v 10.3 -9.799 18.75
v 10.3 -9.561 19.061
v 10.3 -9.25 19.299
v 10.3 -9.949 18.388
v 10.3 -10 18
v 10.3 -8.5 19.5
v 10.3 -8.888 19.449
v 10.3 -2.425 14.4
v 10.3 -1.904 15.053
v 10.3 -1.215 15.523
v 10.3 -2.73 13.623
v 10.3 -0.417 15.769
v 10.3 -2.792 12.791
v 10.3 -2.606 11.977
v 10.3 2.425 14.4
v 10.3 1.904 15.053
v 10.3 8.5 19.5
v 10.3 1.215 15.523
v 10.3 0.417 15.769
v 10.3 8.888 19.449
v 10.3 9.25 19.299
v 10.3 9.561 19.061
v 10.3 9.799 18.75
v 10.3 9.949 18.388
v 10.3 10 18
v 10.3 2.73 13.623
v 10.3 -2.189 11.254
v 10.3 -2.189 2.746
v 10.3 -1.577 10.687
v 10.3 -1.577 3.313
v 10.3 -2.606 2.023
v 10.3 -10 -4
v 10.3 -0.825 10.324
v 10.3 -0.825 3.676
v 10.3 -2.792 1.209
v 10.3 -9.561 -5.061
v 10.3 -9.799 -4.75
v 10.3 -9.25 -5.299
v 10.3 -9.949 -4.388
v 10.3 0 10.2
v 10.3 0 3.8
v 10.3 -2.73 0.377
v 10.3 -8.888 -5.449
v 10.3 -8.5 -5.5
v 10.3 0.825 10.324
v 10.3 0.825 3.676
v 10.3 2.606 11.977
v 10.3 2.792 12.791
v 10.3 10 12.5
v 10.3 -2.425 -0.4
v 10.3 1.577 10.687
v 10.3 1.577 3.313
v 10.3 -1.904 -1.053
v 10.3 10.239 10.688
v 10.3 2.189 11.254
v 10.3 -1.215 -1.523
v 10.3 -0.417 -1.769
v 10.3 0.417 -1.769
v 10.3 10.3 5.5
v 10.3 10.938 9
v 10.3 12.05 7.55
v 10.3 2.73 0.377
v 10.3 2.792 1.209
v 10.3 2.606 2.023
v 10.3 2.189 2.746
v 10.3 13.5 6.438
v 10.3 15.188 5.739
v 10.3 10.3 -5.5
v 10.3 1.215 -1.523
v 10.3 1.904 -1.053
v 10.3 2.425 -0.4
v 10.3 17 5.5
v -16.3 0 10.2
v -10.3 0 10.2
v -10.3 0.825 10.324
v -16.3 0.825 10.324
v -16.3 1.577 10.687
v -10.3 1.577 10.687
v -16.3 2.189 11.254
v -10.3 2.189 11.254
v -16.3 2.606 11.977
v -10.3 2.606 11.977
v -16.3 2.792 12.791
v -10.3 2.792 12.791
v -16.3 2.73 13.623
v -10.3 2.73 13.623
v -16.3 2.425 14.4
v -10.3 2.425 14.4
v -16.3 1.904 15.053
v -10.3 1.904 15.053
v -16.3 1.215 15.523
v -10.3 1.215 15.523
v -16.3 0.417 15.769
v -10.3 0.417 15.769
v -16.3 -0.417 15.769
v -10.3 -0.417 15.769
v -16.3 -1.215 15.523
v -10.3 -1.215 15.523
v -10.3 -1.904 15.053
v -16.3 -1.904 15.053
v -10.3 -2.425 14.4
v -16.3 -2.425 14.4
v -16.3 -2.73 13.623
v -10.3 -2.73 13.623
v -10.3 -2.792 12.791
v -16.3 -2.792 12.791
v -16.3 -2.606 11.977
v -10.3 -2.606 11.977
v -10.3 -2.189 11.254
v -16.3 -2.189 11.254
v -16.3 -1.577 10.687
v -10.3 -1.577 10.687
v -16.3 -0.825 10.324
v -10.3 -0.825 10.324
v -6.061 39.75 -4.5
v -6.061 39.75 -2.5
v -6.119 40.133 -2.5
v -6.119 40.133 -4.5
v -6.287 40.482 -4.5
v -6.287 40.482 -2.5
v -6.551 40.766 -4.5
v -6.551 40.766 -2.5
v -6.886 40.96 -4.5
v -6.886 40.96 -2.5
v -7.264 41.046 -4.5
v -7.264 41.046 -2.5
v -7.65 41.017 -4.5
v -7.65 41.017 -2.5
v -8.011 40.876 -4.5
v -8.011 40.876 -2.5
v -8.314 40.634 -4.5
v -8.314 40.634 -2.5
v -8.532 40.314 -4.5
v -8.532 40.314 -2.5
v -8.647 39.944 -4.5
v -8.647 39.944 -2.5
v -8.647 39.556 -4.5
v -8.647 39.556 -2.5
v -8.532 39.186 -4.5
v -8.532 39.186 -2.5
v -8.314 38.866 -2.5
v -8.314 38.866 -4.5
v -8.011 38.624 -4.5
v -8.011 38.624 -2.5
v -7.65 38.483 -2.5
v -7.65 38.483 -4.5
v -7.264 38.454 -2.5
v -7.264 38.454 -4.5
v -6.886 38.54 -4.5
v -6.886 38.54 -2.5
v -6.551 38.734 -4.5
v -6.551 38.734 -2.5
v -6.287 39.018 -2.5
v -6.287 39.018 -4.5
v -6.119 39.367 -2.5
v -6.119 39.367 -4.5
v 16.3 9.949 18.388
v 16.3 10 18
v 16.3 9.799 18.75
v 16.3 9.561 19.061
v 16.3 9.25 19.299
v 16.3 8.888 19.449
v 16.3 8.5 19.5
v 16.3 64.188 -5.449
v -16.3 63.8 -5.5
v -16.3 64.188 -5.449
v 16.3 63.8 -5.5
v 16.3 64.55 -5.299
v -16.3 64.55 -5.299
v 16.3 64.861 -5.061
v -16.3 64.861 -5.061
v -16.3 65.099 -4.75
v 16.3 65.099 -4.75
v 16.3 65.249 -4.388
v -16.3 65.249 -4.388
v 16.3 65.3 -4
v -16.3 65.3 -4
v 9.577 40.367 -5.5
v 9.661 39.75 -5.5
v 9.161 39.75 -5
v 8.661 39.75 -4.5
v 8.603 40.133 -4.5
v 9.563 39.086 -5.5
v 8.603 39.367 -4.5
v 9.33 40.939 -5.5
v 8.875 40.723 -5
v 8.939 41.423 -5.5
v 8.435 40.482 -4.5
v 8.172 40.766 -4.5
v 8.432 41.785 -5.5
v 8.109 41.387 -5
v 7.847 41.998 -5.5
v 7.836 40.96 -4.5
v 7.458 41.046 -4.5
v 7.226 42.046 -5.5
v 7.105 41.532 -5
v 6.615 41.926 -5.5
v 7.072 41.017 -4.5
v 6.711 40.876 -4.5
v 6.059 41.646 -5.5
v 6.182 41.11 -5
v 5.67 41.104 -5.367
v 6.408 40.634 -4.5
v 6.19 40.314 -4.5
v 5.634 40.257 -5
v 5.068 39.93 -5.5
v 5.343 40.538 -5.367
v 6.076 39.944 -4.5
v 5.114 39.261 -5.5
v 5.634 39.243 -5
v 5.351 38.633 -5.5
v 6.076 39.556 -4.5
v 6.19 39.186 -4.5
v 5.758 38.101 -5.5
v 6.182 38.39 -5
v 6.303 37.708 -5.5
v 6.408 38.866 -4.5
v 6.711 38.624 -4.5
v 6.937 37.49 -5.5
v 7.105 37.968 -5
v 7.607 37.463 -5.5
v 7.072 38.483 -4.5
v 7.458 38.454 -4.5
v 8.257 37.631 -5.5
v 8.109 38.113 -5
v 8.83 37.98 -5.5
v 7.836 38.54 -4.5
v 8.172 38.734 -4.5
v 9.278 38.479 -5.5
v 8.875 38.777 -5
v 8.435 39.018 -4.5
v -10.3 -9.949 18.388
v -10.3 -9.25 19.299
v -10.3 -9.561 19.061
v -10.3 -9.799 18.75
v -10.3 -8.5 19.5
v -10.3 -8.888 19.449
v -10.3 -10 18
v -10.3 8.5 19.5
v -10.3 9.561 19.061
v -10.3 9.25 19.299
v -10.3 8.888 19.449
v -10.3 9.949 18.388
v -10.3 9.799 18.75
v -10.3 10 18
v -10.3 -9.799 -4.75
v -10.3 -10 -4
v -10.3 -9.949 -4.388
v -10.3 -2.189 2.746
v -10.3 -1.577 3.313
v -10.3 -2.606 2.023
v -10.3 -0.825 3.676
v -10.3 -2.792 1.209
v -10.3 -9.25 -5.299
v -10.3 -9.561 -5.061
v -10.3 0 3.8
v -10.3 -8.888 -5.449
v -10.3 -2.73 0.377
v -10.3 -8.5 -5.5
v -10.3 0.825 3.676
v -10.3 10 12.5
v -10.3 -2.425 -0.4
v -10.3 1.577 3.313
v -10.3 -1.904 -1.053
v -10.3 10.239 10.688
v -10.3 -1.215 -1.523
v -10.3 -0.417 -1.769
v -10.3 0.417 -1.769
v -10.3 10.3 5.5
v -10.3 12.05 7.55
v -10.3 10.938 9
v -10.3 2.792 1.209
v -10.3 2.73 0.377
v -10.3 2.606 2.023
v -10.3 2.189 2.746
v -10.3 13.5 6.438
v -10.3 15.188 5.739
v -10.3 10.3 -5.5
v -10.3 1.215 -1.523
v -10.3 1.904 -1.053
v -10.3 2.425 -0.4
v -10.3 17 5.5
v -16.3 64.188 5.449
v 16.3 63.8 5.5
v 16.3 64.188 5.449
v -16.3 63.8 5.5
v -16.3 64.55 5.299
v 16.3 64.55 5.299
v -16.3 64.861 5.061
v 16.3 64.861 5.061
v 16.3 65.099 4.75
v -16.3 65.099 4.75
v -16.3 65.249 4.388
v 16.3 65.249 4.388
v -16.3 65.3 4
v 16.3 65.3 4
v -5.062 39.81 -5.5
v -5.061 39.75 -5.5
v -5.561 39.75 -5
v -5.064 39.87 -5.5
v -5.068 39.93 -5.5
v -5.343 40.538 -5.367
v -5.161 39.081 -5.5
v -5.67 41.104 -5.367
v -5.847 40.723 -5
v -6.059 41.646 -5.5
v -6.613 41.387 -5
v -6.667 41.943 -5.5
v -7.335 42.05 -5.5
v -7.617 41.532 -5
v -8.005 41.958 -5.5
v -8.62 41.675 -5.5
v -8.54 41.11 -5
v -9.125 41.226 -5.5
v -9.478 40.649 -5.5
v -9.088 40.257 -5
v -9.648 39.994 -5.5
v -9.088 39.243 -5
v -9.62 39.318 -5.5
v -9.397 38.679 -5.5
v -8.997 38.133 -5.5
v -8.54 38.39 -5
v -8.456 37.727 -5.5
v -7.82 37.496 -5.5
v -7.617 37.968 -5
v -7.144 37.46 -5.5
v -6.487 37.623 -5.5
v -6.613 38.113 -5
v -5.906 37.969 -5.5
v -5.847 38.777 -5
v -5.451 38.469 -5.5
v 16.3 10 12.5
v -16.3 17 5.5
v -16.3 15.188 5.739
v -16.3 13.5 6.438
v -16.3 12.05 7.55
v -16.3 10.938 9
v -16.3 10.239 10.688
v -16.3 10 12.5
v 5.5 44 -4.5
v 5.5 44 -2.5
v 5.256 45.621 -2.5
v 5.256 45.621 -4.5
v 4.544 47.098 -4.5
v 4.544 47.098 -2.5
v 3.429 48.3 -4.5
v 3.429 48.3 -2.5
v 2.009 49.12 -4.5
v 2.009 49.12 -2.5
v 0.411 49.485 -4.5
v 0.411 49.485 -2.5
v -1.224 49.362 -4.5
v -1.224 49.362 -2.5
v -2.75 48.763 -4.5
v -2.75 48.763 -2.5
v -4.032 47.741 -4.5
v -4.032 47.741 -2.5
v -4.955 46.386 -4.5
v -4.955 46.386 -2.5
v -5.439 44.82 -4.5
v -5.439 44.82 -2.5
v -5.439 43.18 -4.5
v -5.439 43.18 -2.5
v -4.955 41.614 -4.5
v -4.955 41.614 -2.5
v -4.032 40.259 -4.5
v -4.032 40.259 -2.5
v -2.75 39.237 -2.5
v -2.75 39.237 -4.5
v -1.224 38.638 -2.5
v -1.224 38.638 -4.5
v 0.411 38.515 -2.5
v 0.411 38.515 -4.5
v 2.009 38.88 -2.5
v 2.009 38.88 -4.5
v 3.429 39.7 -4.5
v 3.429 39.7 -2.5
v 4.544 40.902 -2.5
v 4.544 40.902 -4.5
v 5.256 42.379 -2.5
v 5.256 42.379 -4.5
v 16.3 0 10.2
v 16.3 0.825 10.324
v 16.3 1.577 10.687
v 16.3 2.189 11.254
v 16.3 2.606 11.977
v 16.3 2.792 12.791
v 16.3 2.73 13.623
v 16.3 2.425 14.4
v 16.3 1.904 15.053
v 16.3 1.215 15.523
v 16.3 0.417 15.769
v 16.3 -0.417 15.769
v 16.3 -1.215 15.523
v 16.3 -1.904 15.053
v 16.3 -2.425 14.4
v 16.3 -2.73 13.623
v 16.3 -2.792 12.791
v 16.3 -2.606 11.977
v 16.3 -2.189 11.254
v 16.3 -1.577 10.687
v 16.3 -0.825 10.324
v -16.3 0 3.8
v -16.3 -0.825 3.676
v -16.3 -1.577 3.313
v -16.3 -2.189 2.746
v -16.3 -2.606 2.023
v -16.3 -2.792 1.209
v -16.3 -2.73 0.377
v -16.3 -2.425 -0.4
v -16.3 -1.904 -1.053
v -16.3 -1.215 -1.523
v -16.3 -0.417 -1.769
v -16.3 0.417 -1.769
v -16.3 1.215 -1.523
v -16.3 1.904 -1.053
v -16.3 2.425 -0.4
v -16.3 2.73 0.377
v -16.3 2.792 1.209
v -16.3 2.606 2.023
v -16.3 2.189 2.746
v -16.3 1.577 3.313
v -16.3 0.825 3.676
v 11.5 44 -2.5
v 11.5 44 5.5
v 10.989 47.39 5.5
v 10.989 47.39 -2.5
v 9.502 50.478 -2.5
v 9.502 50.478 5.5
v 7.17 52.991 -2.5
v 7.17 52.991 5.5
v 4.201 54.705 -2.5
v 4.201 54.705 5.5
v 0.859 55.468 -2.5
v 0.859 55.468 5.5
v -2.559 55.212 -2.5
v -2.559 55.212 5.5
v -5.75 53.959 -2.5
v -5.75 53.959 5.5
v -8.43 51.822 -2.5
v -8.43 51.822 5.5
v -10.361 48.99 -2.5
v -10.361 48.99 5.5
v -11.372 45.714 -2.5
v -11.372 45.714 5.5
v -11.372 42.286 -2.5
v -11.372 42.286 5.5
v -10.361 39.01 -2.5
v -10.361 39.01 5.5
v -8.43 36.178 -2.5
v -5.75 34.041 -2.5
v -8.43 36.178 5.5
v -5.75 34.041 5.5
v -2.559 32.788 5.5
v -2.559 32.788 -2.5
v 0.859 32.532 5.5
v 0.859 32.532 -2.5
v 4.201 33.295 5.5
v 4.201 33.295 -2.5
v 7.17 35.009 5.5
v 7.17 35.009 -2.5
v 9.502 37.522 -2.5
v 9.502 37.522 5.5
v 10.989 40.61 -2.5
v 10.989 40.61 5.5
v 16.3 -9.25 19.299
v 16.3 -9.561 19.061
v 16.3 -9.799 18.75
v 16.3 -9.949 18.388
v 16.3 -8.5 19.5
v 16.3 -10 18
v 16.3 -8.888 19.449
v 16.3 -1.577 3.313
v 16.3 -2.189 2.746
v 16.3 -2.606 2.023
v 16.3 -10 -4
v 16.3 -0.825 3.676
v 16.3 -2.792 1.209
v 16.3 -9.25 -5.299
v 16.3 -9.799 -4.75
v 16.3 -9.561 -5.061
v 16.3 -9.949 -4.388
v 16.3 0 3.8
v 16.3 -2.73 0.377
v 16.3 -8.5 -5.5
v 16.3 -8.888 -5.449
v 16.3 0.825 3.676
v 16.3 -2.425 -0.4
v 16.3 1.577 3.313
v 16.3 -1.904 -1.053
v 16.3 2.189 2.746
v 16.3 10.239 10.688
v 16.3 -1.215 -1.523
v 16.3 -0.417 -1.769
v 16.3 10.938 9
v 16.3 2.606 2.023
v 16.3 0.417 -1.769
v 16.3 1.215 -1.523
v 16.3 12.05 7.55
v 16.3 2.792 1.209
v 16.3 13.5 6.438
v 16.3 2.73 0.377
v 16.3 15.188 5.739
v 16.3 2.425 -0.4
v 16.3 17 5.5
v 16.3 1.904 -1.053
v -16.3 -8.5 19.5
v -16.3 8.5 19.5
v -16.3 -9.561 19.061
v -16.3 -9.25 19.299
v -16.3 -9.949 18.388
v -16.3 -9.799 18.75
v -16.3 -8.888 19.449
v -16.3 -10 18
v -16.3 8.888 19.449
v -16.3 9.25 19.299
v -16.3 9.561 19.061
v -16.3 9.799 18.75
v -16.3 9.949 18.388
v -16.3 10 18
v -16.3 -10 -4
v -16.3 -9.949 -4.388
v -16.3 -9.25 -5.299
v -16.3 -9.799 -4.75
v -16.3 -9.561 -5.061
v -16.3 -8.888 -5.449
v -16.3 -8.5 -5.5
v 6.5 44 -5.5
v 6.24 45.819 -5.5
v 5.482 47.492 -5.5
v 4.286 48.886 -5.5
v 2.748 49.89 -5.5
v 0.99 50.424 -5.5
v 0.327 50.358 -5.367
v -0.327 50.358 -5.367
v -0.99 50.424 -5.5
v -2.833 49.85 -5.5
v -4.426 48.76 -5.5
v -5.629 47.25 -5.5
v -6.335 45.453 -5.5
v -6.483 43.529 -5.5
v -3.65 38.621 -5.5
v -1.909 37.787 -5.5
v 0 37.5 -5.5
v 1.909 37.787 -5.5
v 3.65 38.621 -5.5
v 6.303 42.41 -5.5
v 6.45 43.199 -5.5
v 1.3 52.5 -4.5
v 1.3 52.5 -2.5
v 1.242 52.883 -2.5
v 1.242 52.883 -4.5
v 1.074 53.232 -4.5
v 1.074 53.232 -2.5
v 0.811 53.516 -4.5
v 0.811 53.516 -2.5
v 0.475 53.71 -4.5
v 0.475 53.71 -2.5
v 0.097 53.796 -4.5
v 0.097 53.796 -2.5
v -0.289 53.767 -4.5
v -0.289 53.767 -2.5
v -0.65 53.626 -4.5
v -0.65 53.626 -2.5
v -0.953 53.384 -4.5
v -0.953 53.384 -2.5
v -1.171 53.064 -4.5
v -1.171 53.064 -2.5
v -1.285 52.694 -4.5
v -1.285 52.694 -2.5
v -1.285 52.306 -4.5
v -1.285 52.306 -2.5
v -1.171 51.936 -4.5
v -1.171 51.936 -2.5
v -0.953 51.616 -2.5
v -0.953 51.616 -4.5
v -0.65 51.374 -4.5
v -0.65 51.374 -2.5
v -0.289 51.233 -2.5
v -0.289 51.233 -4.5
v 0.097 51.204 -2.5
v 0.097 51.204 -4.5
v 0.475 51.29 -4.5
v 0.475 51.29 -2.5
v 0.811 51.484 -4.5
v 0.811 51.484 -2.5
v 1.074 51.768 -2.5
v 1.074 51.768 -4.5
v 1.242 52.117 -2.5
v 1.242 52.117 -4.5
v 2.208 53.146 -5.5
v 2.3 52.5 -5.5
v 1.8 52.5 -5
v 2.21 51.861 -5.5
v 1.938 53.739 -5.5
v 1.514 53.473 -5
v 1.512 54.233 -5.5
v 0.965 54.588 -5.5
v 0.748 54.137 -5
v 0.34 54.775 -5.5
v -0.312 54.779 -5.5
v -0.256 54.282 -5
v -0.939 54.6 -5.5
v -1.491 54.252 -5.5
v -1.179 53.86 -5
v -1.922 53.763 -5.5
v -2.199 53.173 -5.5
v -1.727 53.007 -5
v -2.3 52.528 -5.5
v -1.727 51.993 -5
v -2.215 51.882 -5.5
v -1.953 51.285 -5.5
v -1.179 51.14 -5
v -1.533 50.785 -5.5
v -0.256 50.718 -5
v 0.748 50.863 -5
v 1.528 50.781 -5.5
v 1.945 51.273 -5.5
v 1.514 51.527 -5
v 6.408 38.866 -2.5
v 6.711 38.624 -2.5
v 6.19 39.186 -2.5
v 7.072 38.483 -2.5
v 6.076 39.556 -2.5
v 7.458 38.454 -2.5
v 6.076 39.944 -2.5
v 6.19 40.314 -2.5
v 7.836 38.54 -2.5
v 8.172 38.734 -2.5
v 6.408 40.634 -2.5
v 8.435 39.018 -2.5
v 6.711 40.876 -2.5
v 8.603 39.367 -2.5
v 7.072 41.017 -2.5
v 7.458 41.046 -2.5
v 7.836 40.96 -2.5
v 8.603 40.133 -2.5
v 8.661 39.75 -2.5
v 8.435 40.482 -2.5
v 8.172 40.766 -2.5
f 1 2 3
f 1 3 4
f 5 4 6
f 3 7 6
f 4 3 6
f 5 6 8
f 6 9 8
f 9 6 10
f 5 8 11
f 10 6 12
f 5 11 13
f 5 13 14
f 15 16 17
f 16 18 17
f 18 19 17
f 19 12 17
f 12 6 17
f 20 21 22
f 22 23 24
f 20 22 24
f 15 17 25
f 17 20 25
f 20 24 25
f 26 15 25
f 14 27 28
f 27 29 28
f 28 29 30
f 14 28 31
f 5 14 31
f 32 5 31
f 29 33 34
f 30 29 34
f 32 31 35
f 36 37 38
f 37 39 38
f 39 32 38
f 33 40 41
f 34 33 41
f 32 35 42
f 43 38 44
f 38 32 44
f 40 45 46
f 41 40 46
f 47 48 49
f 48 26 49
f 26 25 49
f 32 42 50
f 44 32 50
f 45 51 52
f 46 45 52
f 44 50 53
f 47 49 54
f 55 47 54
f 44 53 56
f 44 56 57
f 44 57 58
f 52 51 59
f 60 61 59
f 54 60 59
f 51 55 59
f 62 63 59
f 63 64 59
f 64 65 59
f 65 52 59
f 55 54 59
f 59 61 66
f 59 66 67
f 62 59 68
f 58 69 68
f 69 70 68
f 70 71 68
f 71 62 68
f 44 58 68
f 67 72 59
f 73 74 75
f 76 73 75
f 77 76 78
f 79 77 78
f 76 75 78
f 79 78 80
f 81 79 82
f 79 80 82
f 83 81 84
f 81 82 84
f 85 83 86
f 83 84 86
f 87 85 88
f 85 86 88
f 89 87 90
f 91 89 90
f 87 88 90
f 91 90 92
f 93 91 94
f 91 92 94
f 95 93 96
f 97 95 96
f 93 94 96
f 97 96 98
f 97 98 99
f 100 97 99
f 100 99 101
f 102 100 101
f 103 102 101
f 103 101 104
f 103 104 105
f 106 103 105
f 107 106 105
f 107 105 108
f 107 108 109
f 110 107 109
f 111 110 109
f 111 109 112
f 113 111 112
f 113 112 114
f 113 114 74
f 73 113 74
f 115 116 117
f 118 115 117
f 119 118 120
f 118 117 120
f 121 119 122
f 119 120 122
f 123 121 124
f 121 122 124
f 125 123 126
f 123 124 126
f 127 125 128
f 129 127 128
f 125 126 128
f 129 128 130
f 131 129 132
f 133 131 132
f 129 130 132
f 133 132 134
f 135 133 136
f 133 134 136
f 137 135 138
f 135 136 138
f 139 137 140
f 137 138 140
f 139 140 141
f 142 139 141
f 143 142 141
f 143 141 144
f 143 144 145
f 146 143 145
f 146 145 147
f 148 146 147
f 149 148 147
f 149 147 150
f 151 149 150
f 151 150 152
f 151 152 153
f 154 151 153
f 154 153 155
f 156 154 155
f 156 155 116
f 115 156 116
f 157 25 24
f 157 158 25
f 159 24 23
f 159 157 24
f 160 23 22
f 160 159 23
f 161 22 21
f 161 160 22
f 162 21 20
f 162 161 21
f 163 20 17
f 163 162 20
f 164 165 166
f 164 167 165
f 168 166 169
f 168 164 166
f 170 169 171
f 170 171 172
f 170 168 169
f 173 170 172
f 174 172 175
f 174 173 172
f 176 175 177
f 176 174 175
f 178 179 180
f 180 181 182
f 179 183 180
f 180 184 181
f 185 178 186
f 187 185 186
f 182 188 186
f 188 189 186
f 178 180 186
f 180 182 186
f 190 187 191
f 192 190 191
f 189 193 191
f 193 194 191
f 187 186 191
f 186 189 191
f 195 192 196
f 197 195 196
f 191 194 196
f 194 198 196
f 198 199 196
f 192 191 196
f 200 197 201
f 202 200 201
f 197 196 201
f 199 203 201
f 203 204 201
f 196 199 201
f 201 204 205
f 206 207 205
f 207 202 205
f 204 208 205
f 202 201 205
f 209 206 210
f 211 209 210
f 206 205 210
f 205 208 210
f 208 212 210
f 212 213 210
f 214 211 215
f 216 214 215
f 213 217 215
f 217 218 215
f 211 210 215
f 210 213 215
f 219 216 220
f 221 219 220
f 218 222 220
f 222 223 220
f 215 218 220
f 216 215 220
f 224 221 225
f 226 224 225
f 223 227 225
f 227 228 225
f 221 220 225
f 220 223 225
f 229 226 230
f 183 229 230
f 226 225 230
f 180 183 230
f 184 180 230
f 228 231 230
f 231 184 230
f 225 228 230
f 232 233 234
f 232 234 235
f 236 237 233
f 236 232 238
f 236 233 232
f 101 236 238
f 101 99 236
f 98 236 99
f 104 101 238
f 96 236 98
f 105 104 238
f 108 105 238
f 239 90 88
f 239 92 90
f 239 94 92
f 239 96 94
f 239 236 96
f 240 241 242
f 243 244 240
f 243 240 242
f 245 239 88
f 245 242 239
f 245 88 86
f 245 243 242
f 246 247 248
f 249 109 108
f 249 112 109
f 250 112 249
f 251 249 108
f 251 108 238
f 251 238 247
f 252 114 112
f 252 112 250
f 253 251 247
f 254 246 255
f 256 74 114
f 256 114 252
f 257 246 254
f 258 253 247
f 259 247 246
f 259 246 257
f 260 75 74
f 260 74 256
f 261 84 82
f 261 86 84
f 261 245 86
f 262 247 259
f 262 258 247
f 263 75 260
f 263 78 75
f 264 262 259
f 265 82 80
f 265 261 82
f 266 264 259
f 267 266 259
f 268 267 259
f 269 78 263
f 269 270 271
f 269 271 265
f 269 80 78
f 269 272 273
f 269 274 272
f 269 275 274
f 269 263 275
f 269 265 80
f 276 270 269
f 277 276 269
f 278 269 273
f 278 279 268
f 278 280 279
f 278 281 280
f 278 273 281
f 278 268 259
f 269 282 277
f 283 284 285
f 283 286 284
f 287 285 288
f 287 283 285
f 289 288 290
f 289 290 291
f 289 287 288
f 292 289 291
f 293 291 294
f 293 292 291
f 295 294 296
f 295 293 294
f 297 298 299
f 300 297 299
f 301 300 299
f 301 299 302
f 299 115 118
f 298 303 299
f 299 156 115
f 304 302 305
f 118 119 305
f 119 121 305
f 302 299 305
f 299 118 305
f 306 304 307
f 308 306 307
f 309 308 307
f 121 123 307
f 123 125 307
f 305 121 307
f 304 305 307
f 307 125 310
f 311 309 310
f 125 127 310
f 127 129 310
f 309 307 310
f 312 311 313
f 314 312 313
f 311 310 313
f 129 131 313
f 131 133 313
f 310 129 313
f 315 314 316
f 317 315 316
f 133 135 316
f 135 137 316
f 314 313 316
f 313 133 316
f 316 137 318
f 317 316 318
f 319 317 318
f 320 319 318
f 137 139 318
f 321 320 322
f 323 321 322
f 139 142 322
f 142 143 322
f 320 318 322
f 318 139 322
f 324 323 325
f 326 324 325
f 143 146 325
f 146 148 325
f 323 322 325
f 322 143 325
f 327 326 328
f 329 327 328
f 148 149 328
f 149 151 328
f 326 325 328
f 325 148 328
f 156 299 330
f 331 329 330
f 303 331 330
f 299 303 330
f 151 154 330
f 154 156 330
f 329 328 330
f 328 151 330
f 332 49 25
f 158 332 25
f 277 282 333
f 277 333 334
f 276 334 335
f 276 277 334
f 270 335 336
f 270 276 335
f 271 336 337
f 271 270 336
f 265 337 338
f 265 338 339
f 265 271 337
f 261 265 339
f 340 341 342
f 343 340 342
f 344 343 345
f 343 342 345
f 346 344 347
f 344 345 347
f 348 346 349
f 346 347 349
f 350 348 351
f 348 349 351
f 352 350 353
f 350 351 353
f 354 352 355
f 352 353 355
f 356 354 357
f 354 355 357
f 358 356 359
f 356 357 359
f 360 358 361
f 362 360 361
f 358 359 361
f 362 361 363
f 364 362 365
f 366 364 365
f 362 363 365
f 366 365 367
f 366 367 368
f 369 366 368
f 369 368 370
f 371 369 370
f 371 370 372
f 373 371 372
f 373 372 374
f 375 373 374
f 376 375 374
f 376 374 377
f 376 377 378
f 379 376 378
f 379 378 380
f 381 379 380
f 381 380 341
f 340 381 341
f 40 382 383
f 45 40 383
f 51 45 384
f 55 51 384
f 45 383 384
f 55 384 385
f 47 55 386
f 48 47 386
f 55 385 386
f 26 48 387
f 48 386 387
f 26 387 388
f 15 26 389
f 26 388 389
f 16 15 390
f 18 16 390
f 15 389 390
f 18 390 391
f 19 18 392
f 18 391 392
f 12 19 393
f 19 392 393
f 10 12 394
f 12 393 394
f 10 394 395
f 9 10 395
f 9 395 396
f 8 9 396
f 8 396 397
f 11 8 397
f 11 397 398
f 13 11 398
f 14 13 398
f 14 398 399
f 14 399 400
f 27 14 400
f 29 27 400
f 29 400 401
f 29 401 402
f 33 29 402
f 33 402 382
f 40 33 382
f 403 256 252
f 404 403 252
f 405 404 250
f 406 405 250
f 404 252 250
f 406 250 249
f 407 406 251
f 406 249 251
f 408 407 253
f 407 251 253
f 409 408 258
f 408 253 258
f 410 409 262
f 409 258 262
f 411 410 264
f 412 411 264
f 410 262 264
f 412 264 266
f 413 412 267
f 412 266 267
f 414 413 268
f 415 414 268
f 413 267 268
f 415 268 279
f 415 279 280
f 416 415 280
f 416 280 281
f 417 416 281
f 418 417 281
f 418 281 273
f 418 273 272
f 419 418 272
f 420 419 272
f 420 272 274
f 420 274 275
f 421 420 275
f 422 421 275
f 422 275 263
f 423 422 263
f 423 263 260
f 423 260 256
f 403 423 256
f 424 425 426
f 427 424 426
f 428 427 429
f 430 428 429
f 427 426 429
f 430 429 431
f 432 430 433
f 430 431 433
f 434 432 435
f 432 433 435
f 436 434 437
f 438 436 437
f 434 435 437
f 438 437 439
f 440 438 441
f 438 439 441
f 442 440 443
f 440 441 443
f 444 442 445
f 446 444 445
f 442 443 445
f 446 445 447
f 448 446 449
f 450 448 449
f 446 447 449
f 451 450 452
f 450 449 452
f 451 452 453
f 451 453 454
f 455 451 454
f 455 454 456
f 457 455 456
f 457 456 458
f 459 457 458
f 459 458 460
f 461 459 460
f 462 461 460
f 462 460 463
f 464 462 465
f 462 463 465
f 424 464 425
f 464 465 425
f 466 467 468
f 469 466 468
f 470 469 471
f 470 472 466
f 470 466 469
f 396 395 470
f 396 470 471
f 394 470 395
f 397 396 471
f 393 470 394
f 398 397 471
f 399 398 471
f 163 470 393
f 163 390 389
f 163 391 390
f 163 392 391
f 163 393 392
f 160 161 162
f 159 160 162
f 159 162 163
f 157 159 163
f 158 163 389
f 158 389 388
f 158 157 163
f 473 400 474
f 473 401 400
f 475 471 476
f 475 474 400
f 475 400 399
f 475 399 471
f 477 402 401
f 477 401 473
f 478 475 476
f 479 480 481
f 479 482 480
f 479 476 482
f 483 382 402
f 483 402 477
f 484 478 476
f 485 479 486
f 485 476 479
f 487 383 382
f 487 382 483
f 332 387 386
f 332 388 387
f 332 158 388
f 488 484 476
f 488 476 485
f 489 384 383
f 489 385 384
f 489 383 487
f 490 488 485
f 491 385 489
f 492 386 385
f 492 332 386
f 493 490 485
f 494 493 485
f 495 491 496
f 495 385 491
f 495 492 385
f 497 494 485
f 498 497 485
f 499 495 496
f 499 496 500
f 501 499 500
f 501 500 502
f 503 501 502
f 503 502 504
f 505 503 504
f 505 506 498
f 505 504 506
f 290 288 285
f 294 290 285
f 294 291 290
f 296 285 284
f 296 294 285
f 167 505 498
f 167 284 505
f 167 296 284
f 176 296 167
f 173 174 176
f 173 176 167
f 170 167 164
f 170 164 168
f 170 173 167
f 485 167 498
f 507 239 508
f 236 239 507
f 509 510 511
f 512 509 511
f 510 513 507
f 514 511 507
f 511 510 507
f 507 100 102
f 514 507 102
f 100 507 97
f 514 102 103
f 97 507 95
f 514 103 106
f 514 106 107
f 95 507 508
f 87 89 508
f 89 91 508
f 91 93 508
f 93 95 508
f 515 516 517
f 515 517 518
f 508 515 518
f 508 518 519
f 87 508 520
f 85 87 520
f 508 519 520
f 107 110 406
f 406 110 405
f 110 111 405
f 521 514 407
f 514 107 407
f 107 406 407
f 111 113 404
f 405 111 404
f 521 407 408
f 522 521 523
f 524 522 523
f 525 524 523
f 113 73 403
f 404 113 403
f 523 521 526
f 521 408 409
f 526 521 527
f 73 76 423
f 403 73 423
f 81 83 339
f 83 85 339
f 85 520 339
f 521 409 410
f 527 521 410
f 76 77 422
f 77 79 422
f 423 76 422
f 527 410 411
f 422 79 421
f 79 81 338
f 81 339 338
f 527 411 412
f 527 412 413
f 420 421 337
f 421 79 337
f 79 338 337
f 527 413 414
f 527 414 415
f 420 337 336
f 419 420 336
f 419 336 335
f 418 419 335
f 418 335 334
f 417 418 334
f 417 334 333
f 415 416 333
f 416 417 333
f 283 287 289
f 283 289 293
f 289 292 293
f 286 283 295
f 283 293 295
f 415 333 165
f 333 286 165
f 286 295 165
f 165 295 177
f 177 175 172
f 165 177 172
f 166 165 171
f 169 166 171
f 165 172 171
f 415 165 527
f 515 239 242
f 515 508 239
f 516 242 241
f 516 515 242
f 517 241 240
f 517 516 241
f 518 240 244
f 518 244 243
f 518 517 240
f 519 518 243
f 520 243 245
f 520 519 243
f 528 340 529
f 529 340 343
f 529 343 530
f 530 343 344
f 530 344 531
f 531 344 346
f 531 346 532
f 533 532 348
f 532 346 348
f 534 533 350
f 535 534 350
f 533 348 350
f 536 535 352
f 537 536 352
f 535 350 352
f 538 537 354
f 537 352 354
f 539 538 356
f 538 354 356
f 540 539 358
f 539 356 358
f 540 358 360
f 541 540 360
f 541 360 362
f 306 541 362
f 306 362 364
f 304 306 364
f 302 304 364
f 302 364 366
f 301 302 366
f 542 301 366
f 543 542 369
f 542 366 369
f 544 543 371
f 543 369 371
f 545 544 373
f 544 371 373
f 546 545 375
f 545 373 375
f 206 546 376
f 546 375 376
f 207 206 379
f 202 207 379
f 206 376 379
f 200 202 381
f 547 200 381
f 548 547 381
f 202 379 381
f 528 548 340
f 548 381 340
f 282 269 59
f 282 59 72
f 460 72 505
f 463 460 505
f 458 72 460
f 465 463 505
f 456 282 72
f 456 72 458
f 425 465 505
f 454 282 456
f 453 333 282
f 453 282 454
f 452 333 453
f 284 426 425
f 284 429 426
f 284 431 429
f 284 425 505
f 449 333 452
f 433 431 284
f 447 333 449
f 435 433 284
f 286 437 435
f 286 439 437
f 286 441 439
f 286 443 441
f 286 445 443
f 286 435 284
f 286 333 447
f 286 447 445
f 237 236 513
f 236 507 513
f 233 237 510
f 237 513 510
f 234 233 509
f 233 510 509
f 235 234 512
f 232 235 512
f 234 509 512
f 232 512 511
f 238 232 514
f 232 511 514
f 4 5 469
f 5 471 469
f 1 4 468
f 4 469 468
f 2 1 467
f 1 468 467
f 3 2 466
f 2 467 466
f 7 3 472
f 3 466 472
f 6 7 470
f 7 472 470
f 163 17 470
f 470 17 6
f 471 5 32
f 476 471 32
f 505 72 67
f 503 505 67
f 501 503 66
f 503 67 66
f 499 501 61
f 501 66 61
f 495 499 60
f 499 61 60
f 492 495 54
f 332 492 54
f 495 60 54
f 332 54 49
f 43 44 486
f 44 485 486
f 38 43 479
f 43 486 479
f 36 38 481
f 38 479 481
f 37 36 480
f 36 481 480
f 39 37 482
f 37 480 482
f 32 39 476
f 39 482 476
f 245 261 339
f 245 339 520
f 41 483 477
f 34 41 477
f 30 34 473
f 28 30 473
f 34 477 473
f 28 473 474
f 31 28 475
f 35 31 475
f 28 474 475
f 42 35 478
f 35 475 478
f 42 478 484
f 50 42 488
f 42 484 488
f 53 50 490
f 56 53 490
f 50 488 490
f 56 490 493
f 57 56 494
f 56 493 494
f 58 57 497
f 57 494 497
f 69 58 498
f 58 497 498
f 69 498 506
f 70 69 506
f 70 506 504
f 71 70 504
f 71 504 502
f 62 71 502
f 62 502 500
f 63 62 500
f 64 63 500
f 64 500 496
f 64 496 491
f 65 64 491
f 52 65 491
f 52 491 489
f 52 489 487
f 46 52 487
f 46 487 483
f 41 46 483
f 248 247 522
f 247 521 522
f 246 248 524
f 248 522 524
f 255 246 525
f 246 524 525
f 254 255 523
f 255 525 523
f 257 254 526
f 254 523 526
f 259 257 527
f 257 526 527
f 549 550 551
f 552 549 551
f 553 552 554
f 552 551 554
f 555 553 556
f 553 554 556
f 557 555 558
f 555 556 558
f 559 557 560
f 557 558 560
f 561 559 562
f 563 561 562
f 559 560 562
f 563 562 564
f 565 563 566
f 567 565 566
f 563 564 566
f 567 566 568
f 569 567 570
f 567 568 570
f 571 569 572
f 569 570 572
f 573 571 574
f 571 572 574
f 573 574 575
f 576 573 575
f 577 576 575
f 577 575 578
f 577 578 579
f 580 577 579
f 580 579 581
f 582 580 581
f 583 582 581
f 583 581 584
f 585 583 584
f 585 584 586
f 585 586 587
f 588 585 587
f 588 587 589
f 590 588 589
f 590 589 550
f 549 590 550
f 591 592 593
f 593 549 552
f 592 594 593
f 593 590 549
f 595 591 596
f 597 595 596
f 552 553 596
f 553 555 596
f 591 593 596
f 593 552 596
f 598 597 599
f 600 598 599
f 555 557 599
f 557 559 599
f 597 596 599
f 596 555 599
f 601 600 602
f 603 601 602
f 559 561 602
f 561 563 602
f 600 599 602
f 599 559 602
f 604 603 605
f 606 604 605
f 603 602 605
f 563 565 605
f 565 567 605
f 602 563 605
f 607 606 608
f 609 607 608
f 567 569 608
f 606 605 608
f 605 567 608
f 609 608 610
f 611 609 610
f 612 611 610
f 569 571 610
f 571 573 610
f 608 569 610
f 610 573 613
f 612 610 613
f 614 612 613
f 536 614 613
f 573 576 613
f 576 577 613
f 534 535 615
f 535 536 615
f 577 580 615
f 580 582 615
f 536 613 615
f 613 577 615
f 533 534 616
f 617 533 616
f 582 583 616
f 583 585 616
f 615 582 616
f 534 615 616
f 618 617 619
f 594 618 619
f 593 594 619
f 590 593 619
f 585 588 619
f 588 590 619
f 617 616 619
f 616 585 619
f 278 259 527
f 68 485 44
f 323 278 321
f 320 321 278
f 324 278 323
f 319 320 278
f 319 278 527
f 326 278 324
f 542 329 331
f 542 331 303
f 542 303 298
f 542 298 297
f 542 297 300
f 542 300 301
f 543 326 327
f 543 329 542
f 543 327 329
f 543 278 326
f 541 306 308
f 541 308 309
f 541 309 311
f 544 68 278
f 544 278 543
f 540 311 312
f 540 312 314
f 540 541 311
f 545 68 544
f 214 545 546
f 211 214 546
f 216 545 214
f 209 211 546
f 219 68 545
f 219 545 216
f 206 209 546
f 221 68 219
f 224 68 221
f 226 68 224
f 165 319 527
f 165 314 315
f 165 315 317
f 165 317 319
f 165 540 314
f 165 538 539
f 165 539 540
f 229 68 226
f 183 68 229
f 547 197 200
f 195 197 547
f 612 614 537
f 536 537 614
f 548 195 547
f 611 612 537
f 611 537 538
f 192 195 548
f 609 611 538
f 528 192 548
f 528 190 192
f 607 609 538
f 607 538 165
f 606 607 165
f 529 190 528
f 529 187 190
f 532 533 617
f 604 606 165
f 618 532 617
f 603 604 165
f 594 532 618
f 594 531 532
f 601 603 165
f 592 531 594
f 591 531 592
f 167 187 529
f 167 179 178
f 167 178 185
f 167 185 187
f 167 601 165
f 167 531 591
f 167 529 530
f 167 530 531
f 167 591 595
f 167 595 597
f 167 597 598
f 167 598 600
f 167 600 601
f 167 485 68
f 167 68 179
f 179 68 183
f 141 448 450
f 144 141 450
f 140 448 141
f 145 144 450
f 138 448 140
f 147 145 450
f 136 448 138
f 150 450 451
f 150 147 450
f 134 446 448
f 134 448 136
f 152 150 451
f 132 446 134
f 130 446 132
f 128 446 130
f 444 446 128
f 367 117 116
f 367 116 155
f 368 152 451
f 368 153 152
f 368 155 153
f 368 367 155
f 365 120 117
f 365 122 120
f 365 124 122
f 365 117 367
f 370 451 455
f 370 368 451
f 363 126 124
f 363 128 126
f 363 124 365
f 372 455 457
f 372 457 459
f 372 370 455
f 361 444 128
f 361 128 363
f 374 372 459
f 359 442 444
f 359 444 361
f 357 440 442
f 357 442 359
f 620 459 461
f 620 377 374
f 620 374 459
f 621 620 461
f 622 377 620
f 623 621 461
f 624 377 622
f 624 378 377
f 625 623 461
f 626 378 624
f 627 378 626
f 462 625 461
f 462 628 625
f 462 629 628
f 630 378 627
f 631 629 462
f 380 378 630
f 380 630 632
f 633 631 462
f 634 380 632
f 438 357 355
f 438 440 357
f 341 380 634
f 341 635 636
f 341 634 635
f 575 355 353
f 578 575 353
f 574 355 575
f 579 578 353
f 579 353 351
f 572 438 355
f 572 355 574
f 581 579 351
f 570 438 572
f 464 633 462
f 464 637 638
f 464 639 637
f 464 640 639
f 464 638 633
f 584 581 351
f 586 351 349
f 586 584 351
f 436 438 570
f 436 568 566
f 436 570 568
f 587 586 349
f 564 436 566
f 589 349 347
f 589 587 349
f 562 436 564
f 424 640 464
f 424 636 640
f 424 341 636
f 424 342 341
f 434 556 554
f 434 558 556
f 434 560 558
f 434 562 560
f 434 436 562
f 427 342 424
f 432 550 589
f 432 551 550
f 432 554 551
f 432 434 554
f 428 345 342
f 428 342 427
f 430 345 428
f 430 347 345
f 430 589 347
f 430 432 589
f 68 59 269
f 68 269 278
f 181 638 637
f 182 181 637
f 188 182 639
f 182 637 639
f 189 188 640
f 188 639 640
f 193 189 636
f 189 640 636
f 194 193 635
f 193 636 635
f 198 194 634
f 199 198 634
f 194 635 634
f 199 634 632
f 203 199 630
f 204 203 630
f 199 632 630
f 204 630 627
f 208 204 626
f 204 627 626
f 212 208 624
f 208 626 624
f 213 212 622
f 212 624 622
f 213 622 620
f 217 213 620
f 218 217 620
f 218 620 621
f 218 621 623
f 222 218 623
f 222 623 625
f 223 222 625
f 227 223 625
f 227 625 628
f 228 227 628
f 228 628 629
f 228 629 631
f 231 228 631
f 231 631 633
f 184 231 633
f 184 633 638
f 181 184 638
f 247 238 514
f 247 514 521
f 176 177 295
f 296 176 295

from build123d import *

# Parameters (mm, degrees)
EXTRUDE1_DEPTH      = 10.3
EXTRUDE1_DEPTH_BACK = 10.3
SKETCH1_W           = 11
SKETCH1_H           = 55
EXTRUDE2_DEPTH      = 6
SKETCH5_R           = 5.5
EXTRUDE4_DEPTH      = 69.744308855
SKETCH_1_R          = 2.8
CUT_EXTRUDE_1_DEPTH = 76.545350618
FILLET2_R           = 1.5
SKETCH_3_R          = 11.5
CUT_EXTRUDE_2_DEPTH = 8
SKETCH_4_R          = 1.3
CUT_EXTRUDE_3_DEPTH = 71.80805039
CHAMFER_1_SIZE      = 1


with BuildPart() as part:
    # Sketch1 → Extrude1 (new, two sides: drawn at the far end of the back side and taken through both)
    with BuildSketch(Plane(origin=(0, 0, 0), x_dir=(0, 0, -1), z_dir=(1, 0, 0)).offset(-EXTRUDE1_DEPTH_BACK)):
        with Locations((0, 37.8)):
            Rectangle(SKETCH1_W, SKETCH1_H)
    extrude(amount=EXTRUDE1_DEPTH + EXTRUDE1_DEPTH_BACK)

    # Sketch2 → Extrude2 (add)
    with BuildSketch(Plane(origin=(10.3, 0, 0), x_dir=(0, 0, -1), z_dir=(1, 0, 0))):
        with BuildLine():
            Line((-19.5, 10), (-19.5, -10))
            Line((-19.5, -10), (5.5, -10))
            Line((5.5, -10), (5.5, 17))
            Line((5.5, 17), (5.5, 65.3))
            Line((5.5, 65.3), (-5.5, 65.3))
            Line((-5.5, 65.3), (-5.5, 17))
            ThreePointArc((-5.5, 17), (-7.550252532, 12.050252532), (-12.5, 10))
            Line((-12.5, 10), (-19.5, 10))
        make_face()
    extrude2 = extrude(amount=EXTRUDE2_DEPTH)

    # Mirror2: Extrude2 across plane
    add(extrude2.mirror(Plane(origin=(0, 0, 0), x_dir=(0, 0, 1), z_dir=(1, 0, 0))))

    # Sketch5 → Extrude4 (cut, through all)
    with BuildSketch(Plane.XY.offset(5.5)):
        with Locations((0, 44)):
            Circle(SKETCH5_R)
    extrude(amount=-EXTRUDE4_DEPTH, mode=Mode.SUBTRACT)

    # Эскиз1 → Вырез-Вытянуть1 (cut, through all)
    with BuildSketch(Plane(origin=(16.3, 0, 0), x_dir=(0, 0, -1), z_dir=(1, 0, 0))):
        with Locations((-13, 0)):
            Circle(SKETCH_1_R)
        with Locations(Location((-1, 0, 0), (0, 0, 180))):
            Circle(SKETCH_1_R)
    extrude(amount=-CUT_EXTRUDE_1_DEPTH, mode=Mode.SUBTRACT)

    # Fillet2
    fillet2_edges = [part.edges().sort_by_distance(p)[0] for p in [
        (13.3, -10, 19.5),
        (13.3, -10, -5.5),
        (13.3, 10, 19.5),
        (-13.3, -10, -5.5),
        (-13.3, -10, 19.5),
        (-13.3, 10, 19.5),
        (0, 65.3, 5.5),
        (0, 65.3, -5.5),
    ]]
    fillet(fillet2_edges, radius=FILLET2_R)

    # Эскиз3 → Вырез-Вытянуть2 (cut)
    with BuildSketch(Plane.XY.offset(5.5)):
        with Locations((0, 44)):
            Circle(SKETCH_3_R)
    extrude(amount=-CUT_EXTRUDE_2_DEPTH, mode=Mode.SUBTRACT)

    # Эскиз4 → Вырез-Вытянуть3 (cut, through all)
    with BuildSketch(Plane.XY.offset(-2.5)):
        with Locations((0, 52.5)):
            Circle(SKETCH_4_R)
        with Locations((7.361215932, 39.75)):
            Circle(SKETCH_4_R)
        with Locations((-7.361215932, 39.75)):
            Circle(SKETCH_4_R)
    extrude(amount=-CUT_EXTRUDE_3_DEPTH, mode=Mode.SUBTRACT)

    # Фаска1
    # the kernel refuses this chamfer: 1 mm, written as the material it takes off along each edge
    with BuildSketch(Plane(origin=(0, 52.5, -5.5), x_dir=(1, 0, 0), z_dir=(0, -1, 0))) as chamfer_1_piece_1:
        Polygon((1.3 + CHAMFER_1_SIZE, 0), (1.3, CHAMFER_1_SIZE), (1.3, 0), align=None)
    revolve(axis=Axis((0, 52.5, -5.5), (0, 0, 1)), mode=Mode.SUBTRACT)
    with BuildSketch(Plane(origin=(7.361215932, 39.75, -5.5), x_dir=(1, 0, 0), z_dir=(0, -1, 0))) as chamfer_1_piece_2:
        Polygon((1.3 + CHAMFER_1_SIZE, 0), (1.3, CHAMFER_1_SIZE), (1.3, 0), align=None)
    revolve(axis=Axis((7.361215932, 39.75, -5.5), (0, 0, 1)), mode=Mode.SUBTRACT)
    with BuildSketch(Plane(origin=(-7.361215932, 39.75, -5.5), x_dir=(1, 0, 0), z_dir=(0, -1, 0))) as chamfer_1_piece_3:
        Polygon((1.3 + CHAMFER_1_SIZE, 0), (1.3, CHAMFER_1_SIZE), (1.3, 0), align=None)
    revolve(axis=Axis((-7.361215932, 39.75, -5.5), (0, 0, 1)), mode=Mode.SUBTRACT)
    with BuildSketch(Plane(origin=(0, 44, -5.5), x_dir=(1, 0, 0), z_dir=(0, -1, 0))) as chamfer_1_piece_4:
        Polygon((5.5 + CHAMFER_1_SIZE, 0), (5.5, CHAMFER_1_SIZE), (5.5, 0), align=None)
    revolve(axis=Axis((0, 44, -5.5), (0, 0, 1)), mode=Mode.SUBTRACT)


solid = part.part
